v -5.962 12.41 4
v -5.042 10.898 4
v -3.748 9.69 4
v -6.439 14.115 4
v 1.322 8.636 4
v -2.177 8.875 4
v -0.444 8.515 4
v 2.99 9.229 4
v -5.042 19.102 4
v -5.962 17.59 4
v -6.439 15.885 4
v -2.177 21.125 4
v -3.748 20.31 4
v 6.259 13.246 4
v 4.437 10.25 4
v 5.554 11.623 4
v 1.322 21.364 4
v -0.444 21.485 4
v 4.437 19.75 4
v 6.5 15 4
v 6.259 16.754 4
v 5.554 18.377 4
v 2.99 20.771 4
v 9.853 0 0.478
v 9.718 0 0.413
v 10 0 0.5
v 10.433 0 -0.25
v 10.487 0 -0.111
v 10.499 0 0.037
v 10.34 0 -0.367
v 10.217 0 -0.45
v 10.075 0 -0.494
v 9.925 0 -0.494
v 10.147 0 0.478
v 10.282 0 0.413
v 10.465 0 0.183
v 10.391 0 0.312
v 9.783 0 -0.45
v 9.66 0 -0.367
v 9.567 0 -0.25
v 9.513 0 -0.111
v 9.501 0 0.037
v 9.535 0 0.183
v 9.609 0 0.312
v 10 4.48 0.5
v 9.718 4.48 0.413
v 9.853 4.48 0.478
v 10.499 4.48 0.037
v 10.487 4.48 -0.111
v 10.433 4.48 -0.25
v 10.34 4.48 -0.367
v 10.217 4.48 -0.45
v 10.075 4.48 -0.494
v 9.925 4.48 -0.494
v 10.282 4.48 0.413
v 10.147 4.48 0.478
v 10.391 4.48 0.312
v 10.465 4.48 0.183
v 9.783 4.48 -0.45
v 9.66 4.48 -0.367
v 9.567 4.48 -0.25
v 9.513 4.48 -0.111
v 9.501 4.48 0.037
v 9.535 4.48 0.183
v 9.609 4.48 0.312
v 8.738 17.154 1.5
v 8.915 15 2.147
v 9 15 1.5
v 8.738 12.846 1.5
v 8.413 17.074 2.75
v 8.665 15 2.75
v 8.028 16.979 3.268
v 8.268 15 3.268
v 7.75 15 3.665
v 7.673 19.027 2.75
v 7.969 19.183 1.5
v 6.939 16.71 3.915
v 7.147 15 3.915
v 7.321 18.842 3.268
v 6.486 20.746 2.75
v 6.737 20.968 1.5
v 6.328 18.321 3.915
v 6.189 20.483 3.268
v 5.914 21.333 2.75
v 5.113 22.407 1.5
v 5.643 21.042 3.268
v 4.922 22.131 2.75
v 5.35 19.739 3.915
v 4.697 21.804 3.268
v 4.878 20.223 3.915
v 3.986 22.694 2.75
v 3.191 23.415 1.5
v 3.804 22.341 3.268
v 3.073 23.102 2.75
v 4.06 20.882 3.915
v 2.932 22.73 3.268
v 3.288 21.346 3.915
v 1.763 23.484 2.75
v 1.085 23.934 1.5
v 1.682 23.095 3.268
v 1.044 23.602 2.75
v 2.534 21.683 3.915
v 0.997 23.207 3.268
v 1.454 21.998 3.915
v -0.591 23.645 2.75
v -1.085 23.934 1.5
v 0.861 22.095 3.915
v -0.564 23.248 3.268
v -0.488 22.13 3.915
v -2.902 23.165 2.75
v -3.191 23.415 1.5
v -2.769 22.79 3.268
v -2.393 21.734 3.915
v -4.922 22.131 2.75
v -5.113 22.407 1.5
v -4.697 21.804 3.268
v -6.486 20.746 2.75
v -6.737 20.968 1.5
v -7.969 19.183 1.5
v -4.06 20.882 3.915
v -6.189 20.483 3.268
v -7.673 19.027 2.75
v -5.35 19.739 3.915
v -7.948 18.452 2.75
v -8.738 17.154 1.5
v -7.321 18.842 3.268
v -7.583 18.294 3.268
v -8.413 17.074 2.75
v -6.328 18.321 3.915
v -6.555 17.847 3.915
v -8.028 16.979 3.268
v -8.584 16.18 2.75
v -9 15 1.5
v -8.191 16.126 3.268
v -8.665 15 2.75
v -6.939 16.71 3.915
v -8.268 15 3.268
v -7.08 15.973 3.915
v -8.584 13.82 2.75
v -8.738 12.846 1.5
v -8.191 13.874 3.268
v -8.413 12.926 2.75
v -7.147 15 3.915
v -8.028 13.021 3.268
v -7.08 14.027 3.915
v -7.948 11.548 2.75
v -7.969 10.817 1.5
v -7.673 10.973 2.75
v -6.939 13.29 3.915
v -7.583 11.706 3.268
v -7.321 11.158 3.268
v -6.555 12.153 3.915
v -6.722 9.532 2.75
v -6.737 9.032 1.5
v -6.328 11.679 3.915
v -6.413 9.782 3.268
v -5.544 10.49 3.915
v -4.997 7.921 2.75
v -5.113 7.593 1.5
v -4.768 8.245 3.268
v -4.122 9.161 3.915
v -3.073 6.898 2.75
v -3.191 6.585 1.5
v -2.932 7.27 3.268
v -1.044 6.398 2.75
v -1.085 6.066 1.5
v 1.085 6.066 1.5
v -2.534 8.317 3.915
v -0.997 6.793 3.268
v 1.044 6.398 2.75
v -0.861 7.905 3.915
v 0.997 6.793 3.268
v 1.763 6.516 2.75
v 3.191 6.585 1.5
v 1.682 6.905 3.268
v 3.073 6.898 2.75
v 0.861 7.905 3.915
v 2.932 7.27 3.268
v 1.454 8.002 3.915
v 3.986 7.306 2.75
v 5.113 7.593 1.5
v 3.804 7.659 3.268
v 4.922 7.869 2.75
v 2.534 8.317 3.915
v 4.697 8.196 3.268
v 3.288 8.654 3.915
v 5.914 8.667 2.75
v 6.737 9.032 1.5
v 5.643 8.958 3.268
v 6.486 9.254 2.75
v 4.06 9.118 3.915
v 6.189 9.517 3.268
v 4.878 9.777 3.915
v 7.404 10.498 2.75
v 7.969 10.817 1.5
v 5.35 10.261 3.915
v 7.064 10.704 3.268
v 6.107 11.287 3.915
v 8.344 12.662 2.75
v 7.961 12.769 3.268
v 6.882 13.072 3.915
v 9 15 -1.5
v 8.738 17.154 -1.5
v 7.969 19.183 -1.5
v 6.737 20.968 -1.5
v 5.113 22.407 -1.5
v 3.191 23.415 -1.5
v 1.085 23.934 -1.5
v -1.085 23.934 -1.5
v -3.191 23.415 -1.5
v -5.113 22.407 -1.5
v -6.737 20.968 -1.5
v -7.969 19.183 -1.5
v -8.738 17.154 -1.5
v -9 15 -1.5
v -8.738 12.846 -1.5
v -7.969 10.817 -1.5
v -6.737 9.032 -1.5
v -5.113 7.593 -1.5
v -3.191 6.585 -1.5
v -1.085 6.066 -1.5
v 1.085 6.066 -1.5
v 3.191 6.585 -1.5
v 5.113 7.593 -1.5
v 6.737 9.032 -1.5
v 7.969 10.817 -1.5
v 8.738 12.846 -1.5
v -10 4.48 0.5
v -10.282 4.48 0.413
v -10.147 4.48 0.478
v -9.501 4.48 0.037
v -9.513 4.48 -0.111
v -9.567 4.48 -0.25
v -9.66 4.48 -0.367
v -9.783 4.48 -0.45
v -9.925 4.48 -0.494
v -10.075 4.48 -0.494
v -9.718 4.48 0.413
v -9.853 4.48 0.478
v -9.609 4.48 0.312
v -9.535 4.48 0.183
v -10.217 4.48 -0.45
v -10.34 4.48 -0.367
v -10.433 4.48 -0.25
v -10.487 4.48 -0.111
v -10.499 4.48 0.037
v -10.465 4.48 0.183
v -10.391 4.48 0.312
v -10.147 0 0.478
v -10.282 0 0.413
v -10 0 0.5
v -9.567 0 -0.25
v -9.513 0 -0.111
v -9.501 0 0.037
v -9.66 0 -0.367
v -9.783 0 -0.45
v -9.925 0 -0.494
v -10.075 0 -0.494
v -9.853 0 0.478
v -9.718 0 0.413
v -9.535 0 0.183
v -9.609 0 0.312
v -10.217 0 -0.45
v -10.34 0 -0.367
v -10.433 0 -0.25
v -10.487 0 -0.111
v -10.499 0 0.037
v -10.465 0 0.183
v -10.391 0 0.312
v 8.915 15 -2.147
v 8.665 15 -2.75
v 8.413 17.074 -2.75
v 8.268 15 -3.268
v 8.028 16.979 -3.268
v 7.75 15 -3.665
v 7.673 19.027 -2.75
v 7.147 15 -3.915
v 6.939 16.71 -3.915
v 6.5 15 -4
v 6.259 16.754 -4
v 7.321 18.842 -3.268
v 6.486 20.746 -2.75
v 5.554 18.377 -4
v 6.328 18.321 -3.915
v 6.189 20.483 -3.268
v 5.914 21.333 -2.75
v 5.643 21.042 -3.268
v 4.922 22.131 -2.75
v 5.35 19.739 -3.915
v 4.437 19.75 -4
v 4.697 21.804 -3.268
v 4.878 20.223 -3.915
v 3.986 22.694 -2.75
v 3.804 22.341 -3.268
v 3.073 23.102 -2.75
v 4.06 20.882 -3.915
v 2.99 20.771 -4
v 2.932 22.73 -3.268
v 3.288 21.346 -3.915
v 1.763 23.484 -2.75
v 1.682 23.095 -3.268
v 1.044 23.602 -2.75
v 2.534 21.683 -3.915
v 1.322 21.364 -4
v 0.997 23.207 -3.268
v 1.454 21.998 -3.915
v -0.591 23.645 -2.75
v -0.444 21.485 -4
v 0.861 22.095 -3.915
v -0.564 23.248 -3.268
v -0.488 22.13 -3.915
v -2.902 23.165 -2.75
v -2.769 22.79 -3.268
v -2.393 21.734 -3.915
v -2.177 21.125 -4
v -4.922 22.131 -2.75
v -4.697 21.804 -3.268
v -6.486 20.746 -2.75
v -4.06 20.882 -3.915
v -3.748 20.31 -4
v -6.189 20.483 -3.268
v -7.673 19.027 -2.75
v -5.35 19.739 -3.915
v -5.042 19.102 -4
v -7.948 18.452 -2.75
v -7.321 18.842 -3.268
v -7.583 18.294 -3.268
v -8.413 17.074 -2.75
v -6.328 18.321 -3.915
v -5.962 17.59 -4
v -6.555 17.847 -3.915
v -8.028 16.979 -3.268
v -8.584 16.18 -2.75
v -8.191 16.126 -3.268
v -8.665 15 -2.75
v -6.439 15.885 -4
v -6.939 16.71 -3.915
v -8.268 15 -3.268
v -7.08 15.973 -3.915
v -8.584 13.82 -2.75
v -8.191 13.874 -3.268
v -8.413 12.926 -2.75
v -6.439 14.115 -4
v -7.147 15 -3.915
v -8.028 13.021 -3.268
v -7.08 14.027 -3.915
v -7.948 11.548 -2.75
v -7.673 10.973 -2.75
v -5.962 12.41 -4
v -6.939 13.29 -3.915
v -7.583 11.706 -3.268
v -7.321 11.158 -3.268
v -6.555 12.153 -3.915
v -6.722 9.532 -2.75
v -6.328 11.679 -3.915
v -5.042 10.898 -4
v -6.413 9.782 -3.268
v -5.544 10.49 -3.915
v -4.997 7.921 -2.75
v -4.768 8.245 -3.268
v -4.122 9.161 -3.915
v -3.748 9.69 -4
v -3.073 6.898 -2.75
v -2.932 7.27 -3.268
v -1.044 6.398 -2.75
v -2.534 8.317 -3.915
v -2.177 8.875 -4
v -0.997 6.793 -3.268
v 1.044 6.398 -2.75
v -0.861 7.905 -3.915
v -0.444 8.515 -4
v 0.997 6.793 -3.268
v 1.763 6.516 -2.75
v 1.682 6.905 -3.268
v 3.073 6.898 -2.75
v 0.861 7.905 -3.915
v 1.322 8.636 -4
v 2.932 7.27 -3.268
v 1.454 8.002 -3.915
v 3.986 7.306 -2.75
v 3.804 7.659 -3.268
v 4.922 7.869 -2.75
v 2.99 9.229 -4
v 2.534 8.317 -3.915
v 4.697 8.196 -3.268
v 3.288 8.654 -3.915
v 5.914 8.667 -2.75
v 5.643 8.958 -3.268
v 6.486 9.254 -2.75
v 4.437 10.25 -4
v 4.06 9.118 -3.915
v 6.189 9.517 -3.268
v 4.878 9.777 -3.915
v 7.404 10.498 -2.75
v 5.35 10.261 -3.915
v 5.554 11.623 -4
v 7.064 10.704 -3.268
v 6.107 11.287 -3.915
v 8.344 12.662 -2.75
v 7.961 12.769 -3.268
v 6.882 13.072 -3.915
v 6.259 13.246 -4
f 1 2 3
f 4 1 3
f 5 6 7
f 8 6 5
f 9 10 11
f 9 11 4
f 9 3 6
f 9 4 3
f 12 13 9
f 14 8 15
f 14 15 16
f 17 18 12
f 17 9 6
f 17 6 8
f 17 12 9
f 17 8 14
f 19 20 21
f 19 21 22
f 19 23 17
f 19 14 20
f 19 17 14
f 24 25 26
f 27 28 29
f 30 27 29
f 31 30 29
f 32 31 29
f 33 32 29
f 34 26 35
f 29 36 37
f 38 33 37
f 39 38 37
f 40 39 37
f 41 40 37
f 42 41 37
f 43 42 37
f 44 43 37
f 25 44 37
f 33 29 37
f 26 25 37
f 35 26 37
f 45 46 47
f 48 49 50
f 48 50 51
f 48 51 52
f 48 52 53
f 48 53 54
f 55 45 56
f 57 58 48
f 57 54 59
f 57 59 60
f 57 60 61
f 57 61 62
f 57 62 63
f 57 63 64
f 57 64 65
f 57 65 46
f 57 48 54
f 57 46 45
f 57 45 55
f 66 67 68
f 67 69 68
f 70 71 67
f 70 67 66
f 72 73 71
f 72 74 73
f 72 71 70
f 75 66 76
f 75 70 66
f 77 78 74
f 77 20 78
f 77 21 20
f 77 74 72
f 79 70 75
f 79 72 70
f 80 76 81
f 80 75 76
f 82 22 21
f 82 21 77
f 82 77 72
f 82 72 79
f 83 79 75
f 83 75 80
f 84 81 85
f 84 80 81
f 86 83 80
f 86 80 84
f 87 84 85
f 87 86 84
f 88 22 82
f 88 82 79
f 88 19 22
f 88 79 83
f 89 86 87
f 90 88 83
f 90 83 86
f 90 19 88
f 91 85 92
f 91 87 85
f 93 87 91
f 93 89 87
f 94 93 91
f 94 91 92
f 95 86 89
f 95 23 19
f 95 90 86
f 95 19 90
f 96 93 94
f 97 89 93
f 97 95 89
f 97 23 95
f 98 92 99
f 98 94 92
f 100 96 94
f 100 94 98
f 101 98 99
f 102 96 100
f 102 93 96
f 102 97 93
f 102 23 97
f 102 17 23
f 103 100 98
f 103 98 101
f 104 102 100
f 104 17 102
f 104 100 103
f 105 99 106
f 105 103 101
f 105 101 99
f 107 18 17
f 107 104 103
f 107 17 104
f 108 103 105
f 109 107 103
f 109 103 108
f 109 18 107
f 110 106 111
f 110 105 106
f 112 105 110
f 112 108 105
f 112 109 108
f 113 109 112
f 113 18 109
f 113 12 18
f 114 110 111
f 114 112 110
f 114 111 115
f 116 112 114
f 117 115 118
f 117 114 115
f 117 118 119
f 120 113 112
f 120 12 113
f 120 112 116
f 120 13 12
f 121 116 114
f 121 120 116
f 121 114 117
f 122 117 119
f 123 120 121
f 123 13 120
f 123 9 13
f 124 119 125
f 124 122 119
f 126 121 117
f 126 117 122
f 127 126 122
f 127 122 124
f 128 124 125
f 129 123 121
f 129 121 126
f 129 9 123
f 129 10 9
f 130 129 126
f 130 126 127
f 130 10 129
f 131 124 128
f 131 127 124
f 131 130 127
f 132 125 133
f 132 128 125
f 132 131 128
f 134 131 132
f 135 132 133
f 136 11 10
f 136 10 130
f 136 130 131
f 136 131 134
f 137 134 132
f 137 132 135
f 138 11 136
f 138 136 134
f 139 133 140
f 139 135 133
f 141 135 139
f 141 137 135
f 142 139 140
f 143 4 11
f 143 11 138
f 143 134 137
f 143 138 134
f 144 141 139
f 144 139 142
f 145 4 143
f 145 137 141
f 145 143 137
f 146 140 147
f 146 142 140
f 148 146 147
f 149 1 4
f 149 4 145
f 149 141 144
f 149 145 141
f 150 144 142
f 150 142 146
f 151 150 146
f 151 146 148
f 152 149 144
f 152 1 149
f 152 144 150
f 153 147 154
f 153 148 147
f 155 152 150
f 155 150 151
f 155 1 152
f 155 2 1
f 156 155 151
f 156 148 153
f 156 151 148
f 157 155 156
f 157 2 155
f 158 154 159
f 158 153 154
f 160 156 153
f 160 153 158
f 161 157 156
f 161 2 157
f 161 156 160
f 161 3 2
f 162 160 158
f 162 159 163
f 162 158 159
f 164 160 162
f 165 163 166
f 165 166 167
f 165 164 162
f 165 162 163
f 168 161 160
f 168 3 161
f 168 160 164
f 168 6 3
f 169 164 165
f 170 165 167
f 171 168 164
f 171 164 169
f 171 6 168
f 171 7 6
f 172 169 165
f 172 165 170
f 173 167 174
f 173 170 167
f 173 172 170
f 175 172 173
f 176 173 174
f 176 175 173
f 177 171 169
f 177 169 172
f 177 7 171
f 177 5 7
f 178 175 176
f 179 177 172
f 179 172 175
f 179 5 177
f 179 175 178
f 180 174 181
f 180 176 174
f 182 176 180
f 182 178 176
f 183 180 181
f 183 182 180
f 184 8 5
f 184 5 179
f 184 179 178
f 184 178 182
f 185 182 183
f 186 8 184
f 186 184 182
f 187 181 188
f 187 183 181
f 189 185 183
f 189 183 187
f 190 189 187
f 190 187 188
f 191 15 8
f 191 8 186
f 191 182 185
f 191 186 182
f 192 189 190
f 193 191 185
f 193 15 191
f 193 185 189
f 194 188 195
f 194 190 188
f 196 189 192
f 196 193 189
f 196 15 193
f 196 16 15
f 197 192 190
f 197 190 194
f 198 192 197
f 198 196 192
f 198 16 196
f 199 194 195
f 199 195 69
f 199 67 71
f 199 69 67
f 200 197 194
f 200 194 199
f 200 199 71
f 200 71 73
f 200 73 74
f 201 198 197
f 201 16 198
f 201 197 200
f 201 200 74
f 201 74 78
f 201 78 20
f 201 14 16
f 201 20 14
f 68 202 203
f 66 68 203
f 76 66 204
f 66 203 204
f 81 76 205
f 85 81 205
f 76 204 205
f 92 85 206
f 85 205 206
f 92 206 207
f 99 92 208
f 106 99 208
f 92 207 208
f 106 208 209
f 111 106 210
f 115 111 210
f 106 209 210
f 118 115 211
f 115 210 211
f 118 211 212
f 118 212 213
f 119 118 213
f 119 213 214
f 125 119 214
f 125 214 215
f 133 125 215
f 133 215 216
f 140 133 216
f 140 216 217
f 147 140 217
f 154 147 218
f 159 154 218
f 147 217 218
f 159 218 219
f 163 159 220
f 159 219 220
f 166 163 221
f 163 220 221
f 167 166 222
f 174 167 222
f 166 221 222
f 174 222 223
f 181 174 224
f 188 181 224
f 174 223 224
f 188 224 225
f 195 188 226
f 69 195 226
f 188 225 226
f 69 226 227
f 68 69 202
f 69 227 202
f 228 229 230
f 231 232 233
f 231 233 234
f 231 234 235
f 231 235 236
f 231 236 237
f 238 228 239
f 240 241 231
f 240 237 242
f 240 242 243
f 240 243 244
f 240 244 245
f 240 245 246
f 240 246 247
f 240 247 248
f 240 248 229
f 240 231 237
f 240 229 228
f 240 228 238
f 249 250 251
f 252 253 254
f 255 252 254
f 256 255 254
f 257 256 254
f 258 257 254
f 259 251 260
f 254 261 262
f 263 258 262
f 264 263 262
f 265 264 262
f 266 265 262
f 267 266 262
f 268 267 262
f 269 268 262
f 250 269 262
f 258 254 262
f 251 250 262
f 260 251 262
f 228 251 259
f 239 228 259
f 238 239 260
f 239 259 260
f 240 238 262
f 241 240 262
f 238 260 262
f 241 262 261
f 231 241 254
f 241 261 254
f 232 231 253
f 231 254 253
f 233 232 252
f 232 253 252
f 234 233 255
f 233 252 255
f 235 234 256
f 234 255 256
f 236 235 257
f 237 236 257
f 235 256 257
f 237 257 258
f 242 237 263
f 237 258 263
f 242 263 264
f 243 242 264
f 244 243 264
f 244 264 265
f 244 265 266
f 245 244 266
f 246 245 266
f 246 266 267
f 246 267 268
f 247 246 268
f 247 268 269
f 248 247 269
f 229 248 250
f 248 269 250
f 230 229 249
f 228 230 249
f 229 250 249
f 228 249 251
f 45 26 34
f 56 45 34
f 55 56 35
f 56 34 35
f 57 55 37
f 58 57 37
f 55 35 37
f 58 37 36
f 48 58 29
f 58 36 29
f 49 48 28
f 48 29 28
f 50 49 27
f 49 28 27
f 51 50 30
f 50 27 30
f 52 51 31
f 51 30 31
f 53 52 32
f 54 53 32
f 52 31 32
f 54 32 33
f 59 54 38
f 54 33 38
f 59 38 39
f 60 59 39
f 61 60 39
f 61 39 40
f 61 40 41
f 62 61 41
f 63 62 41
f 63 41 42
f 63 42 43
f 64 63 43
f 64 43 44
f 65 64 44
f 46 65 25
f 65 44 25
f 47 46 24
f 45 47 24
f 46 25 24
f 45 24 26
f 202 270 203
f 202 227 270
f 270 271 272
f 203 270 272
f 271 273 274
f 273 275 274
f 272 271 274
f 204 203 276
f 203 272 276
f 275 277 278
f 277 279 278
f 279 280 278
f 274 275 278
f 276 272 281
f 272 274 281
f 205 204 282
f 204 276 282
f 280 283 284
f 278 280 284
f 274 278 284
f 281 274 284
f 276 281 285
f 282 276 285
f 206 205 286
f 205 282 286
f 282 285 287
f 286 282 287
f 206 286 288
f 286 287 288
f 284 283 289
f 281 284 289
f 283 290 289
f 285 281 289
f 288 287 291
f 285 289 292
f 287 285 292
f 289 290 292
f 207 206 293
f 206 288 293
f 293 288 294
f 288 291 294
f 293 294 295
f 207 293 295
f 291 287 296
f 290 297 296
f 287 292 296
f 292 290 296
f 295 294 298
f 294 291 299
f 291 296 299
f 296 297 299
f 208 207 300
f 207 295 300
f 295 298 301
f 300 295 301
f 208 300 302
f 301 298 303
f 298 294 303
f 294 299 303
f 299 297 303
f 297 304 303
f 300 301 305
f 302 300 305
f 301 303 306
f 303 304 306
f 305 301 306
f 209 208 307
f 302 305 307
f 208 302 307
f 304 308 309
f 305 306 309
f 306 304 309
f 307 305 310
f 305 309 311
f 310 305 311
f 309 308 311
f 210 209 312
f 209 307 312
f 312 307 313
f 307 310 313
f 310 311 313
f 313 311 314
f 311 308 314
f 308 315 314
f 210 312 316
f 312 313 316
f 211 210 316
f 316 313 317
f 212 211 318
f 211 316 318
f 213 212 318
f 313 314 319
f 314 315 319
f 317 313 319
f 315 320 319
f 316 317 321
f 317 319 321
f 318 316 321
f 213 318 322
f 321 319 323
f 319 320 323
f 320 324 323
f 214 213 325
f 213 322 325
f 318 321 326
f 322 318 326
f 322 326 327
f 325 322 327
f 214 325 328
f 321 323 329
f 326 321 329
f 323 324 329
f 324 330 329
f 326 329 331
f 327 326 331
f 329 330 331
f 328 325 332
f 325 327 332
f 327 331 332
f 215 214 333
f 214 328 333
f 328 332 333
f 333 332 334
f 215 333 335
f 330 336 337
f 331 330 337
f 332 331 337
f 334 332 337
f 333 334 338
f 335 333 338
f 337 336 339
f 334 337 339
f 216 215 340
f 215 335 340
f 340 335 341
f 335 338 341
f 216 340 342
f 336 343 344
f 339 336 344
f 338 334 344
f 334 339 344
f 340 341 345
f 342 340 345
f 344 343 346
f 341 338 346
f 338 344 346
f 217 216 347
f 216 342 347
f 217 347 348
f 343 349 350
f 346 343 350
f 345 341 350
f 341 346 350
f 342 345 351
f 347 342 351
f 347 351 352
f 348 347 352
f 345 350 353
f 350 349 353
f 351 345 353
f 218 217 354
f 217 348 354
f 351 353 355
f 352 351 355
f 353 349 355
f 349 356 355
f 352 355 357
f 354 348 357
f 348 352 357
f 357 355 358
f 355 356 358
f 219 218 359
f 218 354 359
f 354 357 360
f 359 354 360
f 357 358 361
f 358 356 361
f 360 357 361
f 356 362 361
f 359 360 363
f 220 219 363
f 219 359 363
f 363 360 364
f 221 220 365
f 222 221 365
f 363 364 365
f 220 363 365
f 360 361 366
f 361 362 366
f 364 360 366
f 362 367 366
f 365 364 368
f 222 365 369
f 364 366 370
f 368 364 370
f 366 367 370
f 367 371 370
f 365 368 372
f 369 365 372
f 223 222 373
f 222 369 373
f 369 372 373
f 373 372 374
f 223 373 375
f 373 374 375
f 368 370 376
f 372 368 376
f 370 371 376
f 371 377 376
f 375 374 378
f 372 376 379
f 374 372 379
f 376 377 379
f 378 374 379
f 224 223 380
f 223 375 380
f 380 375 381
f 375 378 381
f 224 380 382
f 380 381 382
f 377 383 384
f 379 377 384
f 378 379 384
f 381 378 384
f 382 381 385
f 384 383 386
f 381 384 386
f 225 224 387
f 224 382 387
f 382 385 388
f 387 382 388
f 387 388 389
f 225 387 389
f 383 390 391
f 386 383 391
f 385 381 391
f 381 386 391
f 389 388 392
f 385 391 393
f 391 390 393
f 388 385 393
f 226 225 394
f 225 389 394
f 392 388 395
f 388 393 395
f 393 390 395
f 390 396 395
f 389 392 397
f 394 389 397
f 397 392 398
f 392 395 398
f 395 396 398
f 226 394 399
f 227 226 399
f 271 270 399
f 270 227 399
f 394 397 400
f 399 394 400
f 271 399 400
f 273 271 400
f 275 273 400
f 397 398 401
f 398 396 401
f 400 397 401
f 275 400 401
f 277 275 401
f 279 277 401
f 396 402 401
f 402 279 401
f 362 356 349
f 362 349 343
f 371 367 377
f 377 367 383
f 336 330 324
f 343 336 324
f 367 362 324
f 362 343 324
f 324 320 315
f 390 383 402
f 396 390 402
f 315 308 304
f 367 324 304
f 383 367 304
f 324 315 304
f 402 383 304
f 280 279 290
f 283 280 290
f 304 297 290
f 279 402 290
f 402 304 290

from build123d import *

# Parameters (mm, degrees)
EXTRUDE_1_DEPTH      = 4
EXTRUDE_1_DEPTH_BACK = 4
SKETCH_1_R           = 9
SKETCH_3_R           = 0.5
EXTRUDE_2_DEPTH      = 4.48
EXTRUDE_2_2_DEPTH    = 4.48
FILLET_1_R           = 2.5


with BuildPart() as part:
    # Эскиз1 → Вытянуть1 (new, two sides: drawn at the far end of the back side and taken through both)
    with BuildSketch(Plane.XY.offset(-EXTRUDE_1_DEPTH_BACK)):
        with Locations((0, 15)):
            Circle(SKETCH_1_R)
    extrude(amount=EXTRUDE_1_DEPTH + EXTRUDE_1_DEPTH_BACK)

    # Скругление1
    fillet_1_edges = [part.edges().sort_by_distance(p)[0] for p in [
        (-9, 15, -4),
        (-9, 15, 4),
    ]]
    fillet(fillet_1_edges, radius=FILLET_1_R)


with BuildPart() as body_2:
    # Эскиз3 → Вытянуть2 (new body)
    with BuildSketch(Plane(origin=(0, 0, 0), x_dir=(1, 0, 0), z_dir=(0, 1, 0))):
        with Locations((-10, 0)):
            Circle(SKETCH_3_R)
    extrude(amount=EXTRUDE_2_DEPTH)


with BuildPart() as body_3:
    # Эскиз3 → Extrude 2 2 (new body)
    with BuildSketch(Plane(origin=(0, 0, 0), x_dir=(1, 0, 0), z_dir=(0, 1, 0))):
        with Locations((10, 0)):
            Circle(SKETCH_3_R)
    extrude(amount=EXTRUDE_2_2_DEPTH)


solid = Compound([part.part, body_2.part, body_3.part])
